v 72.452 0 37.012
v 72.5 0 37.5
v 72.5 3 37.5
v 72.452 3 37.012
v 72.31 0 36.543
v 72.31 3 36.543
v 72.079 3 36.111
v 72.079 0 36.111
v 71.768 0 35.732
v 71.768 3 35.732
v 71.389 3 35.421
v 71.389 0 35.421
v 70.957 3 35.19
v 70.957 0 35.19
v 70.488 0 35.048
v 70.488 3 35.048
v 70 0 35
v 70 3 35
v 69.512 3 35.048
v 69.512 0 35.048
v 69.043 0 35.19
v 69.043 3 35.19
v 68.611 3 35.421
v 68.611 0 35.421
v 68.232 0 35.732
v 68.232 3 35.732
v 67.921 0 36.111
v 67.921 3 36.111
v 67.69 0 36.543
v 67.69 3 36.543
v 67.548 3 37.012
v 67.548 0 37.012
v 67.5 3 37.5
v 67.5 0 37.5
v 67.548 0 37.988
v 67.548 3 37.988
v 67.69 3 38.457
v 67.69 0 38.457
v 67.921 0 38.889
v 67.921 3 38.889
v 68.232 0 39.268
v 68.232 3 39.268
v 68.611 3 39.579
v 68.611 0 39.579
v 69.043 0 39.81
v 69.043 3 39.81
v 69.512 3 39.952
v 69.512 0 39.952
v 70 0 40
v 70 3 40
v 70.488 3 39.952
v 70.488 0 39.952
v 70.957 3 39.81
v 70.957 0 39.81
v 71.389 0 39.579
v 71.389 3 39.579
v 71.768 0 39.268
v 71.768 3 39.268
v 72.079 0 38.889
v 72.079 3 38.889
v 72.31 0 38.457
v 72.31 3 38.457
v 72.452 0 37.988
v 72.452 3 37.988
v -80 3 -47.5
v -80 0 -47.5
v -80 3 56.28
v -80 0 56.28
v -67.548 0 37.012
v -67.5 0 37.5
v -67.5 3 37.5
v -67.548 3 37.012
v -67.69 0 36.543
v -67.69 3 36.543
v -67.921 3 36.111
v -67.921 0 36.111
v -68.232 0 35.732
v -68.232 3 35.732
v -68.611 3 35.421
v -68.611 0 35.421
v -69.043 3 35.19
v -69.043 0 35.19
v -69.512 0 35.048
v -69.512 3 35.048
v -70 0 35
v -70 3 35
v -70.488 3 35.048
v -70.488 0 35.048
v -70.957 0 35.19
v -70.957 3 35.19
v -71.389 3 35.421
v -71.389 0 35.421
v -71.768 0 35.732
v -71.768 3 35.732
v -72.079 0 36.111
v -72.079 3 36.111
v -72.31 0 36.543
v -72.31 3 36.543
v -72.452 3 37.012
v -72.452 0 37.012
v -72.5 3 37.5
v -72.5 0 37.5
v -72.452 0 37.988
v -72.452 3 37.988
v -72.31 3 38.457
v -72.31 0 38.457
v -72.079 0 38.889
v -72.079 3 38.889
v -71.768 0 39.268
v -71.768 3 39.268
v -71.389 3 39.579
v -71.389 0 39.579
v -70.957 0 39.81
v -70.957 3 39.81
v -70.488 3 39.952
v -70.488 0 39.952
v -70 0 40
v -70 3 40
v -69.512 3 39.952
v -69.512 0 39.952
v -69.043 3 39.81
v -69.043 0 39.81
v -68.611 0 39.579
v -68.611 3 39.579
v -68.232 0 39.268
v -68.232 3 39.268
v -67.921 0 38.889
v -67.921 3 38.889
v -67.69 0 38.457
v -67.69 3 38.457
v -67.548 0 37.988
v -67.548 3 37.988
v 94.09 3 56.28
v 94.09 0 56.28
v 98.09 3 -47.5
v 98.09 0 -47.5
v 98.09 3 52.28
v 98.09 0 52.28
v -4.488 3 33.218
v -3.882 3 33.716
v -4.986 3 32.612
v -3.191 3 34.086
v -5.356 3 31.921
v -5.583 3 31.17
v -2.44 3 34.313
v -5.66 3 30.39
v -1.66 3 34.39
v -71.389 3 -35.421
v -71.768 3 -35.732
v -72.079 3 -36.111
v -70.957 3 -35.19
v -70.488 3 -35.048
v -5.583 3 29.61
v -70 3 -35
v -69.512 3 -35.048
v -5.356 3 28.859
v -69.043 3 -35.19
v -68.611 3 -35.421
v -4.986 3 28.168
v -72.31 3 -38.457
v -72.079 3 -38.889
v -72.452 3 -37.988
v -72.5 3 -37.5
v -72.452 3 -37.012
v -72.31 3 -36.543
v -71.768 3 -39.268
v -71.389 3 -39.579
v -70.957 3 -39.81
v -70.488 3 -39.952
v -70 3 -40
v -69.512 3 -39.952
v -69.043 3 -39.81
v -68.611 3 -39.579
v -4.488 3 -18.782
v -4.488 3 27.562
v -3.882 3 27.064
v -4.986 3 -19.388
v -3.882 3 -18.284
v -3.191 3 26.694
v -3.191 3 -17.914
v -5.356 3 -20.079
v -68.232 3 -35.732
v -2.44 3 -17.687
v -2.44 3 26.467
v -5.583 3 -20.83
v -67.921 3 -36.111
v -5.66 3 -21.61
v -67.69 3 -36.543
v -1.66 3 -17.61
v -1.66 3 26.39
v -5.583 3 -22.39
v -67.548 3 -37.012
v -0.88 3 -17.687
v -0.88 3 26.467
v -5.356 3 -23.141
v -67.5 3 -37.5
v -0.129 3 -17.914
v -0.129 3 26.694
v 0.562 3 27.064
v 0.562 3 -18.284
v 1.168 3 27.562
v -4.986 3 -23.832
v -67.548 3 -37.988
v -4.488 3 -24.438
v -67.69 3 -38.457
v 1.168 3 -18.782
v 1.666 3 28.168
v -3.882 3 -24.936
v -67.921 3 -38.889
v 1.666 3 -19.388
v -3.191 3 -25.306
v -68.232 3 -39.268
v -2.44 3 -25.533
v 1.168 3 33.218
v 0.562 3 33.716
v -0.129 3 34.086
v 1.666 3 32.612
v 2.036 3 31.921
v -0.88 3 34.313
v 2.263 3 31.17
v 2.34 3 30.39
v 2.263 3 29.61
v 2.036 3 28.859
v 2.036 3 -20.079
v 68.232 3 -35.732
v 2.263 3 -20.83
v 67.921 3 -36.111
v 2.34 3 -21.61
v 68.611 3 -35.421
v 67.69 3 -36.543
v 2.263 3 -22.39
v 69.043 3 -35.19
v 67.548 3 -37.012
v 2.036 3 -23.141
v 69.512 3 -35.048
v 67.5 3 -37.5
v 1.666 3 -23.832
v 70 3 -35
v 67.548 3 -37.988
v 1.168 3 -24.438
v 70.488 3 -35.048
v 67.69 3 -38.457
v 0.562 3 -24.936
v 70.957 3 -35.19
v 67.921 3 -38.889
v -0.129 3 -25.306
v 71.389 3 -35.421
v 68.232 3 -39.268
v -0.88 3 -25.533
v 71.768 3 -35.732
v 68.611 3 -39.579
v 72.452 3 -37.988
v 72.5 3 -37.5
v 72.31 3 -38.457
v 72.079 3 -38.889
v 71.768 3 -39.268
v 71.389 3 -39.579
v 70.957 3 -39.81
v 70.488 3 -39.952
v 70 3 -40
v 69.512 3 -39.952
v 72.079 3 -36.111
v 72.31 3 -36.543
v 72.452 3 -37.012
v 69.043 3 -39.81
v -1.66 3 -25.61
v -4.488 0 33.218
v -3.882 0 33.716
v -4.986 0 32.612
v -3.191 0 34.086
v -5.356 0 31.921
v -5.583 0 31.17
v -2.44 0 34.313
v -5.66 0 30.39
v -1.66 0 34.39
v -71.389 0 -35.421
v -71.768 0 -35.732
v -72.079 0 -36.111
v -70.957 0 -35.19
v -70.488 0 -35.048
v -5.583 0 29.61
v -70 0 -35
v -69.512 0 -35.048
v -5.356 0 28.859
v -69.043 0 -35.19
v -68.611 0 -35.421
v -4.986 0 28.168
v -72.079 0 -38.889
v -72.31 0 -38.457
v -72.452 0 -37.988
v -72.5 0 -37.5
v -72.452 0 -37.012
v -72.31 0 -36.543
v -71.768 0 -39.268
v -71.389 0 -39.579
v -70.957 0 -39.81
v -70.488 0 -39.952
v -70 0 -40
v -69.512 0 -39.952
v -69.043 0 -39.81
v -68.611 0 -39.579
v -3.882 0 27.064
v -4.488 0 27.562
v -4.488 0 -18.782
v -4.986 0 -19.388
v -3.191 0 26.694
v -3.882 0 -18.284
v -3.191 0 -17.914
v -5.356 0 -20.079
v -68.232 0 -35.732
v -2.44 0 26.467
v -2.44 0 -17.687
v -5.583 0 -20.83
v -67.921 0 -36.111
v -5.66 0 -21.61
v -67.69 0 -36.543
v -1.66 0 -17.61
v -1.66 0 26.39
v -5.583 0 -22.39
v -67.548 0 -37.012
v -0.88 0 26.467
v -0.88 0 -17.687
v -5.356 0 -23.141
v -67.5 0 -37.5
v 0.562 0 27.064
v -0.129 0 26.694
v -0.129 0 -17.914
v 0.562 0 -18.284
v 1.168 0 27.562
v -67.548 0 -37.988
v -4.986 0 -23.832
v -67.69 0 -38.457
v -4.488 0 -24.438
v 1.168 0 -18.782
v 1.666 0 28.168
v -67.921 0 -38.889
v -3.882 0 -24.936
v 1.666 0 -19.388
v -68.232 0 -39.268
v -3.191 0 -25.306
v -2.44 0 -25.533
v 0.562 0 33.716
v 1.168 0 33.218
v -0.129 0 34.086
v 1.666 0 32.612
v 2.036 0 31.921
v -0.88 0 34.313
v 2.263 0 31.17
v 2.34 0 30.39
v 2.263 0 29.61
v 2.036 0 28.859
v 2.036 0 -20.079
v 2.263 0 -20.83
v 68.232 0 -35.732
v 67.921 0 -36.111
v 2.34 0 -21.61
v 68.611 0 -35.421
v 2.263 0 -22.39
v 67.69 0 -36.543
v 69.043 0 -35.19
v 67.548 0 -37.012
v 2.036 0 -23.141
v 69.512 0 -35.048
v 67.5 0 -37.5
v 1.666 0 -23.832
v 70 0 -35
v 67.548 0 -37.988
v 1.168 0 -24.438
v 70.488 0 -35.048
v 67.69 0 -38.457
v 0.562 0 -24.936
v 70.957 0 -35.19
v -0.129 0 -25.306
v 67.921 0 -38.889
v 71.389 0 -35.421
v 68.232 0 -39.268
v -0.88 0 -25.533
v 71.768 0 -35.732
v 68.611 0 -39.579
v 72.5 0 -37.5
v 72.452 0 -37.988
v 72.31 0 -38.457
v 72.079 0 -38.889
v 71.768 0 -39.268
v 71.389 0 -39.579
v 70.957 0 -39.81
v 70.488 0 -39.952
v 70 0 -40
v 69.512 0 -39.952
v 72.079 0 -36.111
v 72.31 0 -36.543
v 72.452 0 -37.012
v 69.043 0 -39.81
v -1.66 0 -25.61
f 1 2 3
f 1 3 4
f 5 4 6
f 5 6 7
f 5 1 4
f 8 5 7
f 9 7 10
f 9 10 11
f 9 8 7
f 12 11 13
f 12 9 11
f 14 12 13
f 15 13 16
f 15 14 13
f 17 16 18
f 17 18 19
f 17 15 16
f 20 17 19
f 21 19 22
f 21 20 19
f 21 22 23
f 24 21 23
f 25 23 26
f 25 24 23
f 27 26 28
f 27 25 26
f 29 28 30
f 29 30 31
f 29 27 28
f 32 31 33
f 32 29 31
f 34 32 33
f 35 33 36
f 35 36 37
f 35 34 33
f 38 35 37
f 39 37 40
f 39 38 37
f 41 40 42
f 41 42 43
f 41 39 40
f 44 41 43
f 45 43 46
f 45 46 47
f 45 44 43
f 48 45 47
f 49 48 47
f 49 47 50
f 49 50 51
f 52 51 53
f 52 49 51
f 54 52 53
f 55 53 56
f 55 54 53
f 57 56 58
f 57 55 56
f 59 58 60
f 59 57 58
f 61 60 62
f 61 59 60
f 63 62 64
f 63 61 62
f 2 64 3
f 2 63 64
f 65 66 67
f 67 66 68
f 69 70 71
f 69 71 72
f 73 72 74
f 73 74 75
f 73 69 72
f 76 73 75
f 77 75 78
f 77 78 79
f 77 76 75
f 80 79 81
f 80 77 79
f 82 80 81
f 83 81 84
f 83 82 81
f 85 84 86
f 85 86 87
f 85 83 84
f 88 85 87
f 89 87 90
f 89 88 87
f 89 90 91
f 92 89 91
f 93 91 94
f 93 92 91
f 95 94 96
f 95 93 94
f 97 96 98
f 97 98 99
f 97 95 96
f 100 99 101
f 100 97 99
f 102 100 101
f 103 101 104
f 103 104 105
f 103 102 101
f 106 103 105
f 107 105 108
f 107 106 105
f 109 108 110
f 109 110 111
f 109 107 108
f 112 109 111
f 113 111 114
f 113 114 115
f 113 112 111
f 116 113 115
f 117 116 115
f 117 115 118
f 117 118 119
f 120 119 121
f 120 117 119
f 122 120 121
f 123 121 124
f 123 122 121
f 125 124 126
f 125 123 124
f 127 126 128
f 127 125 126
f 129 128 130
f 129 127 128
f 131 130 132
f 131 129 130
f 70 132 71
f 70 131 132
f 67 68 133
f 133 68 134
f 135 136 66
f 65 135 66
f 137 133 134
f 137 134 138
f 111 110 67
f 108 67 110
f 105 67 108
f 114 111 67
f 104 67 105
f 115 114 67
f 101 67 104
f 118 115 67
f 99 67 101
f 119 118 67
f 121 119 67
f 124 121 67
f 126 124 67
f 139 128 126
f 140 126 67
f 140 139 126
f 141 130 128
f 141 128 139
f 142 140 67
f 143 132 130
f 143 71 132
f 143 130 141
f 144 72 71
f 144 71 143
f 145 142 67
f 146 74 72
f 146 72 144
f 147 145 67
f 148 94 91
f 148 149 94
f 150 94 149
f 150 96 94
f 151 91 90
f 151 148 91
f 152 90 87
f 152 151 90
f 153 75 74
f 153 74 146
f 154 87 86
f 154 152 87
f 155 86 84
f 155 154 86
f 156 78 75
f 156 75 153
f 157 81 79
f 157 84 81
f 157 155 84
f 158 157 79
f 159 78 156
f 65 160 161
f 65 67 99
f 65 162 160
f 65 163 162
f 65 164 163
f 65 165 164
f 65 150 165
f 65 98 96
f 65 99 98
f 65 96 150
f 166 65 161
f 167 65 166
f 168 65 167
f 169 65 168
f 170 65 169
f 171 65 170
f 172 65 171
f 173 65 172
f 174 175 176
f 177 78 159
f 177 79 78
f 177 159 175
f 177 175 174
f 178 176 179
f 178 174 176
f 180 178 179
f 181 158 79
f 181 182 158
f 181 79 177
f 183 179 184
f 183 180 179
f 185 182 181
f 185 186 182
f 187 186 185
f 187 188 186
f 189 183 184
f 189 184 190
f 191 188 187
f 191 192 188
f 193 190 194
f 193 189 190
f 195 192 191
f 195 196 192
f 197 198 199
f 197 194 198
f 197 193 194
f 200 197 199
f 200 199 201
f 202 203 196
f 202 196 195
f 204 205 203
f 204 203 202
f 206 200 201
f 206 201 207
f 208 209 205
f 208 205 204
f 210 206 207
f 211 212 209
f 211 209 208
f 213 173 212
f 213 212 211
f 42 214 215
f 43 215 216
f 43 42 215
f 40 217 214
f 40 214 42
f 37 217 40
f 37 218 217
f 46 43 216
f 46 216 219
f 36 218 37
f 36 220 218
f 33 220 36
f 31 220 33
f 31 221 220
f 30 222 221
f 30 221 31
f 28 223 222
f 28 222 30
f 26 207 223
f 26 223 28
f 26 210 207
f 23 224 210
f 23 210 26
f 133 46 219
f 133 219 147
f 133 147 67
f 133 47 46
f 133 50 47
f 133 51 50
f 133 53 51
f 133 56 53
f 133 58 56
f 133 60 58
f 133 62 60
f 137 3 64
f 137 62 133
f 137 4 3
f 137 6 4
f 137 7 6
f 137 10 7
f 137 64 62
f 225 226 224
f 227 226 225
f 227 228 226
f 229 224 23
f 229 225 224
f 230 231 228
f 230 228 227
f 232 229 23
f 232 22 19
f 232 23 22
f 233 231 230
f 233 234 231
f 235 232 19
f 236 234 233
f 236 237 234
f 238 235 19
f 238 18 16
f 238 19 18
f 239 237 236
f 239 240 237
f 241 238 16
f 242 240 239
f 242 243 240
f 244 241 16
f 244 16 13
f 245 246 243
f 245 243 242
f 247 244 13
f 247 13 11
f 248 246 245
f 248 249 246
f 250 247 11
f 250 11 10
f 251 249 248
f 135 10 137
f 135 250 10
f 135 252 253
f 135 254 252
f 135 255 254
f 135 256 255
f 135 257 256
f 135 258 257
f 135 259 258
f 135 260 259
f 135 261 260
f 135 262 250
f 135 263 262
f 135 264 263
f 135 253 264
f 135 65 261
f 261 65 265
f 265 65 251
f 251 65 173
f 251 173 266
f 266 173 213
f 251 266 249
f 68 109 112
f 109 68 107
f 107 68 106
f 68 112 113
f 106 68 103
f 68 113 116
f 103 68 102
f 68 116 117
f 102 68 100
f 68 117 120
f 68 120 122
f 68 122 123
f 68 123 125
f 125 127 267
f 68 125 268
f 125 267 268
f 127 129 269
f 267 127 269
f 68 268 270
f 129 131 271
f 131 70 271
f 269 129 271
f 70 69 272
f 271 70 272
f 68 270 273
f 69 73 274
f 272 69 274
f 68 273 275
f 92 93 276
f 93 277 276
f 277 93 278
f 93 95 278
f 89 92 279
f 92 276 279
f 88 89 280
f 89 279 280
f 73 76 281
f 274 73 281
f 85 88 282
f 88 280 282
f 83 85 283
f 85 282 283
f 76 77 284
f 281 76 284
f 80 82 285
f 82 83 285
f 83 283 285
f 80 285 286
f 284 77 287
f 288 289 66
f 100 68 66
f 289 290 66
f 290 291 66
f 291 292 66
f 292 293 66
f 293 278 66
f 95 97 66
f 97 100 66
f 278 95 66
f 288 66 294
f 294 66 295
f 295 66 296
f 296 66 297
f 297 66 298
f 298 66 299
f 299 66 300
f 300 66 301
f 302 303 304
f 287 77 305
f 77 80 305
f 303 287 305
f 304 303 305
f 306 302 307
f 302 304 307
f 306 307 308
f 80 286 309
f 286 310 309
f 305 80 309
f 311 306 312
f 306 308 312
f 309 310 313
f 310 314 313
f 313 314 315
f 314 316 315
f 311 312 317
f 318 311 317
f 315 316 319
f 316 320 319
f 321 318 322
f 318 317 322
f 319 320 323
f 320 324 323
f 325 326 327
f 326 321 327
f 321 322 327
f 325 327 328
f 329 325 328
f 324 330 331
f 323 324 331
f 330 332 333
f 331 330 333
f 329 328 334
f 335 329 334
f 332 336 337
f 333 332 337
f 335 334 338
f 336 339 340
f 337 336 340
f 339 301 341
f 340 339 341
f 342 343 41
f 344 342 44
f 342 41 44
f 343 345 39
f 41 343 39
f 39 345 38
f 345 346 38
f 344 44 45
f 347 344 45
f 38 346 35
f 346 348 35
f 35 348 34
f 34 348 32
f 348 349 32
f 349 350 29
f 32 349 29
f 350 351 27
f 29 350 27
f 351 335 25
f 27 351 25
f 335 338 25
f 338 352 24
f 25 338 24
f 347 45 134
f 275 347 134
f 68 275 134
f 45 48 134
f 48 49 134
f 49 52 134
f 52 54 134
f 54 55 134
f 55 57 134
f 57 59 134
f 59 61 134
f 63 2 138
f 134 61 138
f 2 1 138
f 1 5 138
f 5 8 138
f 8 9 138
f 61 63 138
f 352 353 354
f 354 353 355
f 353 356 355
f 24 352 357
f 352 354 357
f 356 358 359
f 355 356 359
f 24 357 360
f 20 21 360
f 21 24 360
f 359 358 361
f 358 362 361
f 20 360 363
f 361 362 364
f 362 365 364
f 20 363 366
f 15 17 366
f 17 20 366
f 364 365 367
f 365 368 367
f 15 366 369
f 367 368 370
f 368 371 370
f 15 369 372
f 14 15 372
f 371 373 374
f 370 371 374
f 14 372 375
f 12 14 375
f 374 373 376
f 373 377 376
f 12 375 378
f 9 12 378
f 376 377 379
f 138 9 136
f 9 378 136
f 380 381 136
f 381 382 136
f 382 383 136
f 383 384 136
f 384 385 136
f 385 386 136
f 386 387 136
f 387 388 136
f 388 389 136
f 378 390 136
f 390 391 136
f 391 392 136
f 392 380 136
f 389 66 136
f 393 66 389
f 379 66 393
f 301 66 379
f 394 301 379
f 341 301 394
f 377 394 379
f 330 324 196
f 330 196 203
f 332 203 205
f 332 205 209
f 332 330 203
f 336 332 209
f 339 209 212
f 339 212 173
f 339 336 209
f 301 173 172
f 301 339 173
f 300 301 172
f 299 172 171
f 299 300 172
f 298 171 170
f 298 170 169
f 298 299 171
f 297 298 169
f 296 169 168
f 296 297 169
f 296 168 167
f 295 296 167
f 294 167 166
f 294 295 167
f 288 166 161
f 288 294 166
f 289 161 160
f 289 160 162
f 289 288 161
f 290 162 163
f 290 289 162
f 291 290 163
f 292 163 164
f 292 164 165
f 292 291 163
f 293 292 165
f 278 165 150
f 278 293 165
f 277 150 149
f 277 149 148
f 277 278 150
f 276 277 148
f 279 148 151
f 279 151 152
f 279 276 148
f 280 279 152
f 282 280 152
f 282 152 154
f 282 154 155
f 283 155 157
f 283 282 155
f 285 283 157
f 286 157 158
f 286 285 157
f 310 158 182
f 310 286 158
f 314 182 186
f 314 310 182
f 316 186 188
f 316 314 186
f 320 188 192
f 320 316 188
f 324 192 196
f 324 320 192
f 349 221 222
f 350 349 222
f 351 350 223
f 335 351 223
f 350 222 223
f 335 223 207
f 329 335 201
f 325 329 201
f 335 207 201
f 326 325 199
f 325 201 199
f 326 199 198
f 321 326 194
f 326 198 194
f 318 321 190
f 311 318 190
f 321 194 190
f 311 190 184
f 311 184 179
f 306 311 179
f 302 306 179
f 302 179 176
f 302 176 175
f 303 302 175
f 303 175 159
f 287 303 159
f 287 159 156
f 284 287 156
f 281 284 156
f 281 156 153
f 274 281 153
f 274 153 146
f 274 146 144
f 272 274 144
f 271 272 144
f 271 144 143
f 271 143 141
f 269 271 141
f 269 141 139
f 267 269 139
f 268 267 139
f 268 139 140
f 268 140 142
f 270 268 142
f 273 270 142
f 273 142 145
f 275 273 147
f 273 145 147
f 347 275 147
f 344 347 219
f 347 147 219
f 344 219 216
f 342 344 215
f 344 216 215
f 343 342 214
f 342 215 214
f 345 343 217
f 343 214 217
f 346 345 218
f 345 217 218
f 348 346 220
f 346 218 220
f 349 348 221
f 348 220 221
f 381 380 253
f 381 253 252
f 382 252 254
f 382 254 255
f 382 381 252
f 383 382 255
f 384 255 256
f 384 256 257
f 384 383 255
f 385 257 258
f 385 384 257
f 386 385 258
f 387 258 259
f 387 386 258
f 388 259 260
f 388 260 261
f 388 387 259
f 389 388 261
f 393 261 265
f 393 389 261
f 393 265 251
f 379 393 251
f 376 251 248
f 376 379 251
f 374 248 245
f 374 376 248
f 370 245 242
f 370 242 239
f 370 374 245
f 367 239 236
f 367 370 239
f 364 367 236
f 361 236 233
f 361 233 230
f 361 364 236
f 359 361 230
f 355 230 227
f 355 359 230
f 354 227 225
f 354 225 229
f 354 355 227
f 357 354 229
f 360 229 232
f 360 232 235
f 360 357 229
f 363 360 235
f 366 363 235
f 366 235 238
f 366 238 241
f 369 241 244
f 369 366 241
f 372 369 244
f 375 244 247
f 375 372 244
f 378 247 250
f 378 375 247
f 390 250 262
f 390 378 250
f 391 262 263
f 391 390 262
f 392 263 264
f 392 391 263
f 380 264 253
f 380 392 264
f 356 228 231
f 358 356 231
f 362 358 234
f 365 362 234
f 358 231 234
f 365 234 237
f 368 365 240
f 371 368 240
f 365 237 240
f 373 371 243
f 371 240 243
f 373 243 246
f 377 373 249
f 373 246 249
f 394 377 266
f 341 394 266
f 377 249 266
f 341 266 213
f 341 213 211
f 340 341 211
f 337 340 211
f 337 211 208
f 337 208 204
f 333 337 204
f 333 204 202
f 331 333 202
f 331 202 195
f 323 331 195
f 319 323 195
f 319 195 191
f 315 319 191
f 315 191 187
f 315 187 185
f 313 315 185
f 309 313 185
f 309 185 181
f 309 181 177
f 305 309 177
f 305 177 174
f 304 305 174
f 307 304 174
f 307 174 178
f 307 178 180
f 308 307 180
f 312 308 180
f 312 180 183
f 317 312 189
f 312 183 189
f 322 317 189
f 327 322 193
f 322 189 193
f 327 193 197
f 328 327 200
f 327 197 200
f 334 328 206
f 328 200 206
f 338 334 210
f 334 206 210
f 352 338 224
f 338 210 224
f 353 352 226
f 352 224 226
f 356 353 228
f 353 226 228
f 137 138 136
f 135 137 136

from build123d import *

# Parameters (mm, degrees)
SKETCH2_R           = 2.5
BOSS_EXTRUDE1_DEPTH = 3
CUT_EXTRUDE1_DEPTH  = 4
SKETCH4_R           = 4
CUT_EXTRUDE2_DEPTH  = 5


with BuildPart() as part:
    # Sketch2 → Boss-Extrude1 (new body)
    with BuildSketch(Plane(origin=(0, 0, 0), x_dir=(1, 0, 0), z_dir=(0, 1, 0))):
        Polygon((-80, -37.5), (-80, -56.28), (98.09, -56.28), (98.09, 47.5), (-80, 47.5), align=None)
        with Locations((-70, -37.5)):
            Circle(SKETCH2_R, mode=Mode.SUBTRACT)
        with Locations((-70, 37.5)):
            Circle(SKETCH2_R, mode=Mode.SUBTRACT)
        with Locations((70, 37.5)):
            Circle(SKETCH2_R, mode=Mode.SUBTRACT)
        with Locations((70, -37.5)):
            Circle(SKETCH2_R, mode=Mode.SUBTRACT)
    extrude(amount=BOSS_EXTRUDE1_DEPTH)

    # Sketch3 → Cut-Extrude1 (cut, through all)
    with BuildSketch(Plane(origin=(0, 3, 0), x_dir=(1, 0, 0), z_dir=(0, 1, 0))):
        Polygon((98.09, -56.28), (94.09, -56.28), (98.09, -52.28), align=None)
    extrude(amount=-CUT_EXTRUDE1_DEPTH, mode=Mode.SUBTRACT)

    # Sketch4 → Cut-Extrude2 (cut)
    with BuildSketch(Plane(origin=(0, 3, 0), x_dir=(1, 0, 0), z_dir=(0, 1, 0))):
        with Locations((-1.66, 21.61)):
            Circle(SKETCH4_R)
        with Locations((-1.66, -30.39)):
            Circle(SKETCH4_R)
    extrude(amount=-CUT_EXTRUDE2_DEPTH, mode=Mode.SUBTRACT)


solid = part.part
